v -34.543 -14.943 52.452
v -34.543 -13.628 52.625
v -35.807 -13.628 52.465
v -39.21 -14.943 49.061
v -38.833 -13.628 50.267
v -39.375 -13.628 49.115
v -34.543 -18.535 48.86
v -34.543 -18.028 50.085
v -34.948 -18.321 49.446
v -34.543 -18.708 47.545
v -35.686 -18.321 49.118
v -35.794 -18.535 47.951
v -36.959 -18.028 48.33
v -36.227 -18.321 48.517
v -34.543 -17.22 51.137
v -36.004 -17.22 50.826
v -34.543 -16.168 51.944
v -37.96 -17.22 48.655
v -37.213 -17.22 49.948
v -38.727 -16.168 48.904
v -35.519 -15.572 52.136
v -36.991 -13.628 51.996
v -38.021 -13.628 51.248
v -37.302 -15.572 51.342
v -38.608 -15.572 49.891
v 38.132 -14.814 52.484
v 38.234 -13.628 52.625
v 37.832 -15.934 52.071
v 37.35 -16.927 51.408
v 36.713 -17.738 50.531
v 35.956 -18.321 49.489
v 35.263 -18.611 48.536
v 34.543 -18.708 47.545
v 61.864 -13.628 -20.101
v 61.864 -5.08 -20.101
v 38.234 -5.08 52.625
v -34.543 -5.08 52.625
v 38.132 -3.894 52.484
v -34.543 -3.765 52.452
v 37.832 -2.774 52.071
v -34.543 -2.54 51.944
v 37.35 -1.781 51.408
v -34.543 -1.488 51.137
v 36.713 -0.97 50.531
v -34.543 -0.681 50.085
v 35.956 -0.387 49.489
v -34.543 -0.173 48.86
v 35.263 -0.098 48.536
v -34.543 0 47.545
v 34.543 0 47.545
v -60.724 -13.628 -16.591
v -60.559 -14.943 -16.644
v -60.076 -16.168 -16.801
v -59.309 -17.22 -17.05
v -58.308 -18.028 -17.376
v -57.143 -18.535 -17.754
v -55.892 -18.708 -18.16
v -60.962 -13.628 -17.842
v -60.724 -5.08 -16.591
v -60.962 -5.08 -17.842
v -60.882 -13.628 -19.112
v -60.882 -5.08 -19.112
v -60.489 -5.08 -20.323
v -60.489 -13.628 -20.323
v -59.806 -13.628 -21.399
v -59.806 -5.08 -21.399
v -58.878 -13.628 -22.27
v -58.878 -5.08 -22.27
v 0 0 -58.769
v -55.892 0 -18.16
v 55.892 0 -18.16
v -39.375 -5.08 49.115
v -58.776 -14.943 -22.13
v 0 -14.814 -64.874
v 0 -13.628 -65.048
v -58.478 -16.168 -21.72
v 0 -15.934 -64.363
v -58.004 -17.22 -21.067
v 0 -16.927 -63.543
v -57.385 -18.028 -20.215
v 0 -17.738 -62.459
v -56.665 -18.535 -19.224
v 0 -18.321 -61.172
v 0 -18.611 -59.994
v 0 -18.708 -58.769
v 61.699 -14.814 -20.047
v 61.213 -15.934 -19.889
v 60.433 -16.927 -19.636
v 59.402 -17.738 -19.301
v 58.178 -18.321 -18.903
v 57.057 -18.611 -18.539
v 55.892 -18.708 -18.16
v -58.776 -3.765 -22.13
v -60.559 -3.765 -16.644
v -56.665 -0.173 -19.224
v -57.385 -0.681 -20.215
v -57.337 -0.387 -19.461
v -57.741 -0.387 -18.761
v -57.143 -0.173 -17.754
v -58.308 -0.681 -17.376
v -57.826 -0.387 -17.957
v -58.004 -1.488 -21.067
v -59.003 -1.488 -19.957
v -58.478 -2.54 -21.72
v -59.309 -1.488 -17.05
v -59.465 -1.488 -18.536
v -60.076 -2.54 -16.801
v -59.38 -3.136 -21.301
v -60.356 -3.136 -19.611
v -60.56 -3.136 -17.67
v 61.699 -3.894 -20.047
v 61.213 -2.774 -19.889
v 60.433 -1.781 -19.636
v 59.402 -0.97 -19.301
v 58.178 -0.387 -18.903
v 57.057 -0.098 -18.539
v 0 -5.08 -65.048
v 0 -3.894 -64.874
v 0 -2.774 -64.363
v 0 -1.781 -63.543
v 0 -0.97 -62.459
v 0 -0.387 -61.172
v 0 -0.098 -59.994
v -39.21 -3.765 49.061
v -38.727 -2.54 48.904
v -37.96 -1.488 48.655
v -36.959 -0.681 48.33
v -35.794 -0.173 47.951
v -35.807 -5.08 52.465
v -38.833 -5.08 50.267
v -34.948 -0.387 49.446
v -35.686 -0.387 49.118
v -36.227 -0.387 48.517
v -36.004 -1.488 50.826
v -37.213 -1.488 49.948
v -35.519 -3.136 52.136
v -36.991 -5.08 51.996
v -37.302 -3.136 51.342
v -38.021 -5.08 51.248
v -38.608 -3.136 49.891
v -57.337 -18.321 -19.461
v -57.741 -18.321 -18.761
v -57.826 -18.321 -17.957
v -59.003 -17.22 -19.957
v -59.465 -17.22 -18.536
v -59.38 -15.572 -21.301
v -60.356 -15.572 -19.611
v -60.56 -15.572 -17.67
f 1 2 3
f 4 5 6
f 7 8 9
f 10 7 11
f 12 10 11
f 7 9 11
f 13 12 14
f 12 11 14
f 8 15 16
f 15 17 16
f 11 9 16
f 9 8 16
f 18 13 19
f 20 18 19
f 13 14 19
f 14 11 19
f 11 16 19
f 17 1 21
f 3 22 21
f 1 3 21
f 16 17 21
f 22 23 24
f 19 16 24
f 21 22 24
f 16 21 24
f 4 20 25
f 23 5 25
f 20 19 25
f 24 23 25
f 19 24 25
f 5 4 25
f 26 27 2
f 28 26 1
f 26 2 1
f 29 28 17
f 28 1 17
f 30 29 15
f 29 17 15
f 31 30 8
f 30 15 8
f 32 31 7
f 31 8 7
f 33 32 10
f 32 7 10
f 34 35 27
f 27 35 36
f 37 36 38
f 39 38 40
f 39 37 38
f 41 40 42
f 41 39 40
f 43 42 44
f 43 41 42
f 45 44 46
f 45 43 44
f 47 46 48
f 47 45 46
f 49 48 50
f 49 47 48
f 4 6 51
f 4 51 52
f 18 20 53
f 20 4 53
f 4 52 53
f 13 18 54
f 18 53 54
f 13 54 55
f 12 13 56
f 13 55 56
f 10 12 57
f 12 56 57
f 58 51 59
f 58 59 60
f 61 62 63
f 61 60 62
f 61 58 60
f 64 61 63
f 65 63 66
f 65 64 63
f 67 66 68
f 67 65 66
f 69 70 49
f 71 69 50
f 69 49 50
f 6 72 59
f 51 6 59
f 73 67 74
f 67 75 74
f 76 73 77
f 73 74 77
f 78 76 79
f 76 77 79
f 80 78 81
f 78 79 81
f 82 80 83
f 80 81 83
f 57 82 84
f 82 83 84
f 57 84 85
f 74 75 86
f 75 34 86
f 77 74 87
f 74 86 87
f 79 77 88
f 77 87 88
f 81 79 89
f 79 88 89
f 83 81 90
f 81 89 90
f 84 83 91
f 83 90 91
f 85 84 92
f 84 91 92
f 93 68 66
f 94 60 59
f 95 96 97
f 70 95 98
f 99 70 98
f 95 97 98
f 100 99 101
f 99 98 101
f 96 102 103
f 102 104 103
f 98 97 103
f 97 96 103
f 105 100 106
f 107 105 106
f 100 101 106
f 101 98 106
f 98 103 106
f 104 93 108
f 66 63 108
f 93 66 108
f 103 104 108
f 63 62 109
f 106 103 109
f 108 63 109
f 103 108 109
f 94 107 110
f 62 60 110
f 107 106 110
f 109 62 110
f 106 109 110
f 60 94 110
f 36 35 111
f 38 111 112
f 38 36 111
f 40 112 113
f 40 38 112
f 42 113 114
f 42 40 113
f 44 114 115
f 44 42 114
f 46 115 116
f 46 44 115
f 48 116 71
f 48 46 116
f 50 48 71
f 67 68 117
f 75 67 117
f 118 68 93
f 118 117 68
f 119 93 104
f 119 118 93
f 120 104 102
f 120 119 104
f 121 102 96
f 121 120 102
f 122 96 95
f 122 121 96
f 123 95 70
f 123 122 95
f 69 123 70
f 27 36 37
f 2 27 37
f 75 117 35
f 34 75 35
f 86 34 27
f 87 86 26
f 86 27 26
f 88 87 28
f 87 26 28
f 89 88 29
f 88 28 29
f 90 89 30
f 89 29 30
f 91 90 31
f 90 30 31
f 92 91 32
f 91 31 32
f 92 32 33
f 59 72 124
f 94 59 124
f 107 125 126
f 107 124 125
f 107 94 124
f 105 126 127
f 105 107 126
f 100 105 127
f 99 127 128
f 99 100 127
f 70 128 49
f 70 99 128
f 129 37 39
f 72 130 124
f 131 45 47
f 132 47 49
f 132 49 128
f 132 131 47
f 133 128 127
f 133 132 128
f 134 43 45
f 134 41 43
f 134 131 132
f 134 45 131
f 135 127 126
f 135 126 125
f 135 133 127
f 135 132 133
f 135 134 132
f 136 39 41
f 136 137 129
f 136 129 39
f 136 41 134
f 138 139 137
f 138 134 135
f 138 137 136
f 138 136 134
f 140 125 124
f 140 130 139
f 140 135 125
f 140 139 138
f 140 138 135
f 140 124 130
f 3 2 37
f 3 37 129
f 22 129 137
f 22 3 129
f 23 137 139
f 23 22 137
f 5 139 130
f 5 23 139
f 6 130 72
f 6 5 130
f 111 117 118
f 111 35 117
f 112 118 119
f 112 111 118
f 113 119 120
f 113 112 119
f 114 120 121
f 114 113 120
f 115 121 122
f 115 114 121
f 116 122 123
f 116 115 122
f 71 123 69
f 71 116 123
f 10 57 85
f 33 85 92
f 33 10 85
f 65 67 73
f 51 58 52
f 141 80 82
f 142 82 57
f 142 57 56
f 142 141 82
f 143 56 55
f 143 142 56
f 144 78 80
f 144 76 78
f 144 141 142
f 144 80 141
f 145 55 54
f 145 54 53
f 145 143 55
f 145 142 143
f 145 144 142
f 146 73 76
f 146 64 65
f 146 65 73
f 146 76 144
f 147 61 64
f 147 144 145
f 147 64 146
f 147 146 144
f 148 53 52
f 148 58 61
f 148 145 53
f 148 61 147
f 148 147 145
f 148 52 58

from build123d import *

# Parameters (mm, degrees)
F1_DEPTH = 18.708162
F2_R     = 5.08


with BuildPart() as f1:
    # F0 (on Front) → F1 (new body)
    with BuildSketch(Plane.XZ):
        Polygon((38.234155, 52.624799), (-38.234155, 52.624799), (-61.864162, -20.100885), (0, -65.047829), (61.864162, -20.100885), align=None)
    extrude(amount=F1_DEPTH)

    # F2
    f2_edges = [f1.edges().sort_by_distance(p)[0] for p in [
        (50.049158, -18.708162, 16.261957),
        (50.049158, 0, 16.261957),
        (30.932081, -18.708162, -42.574357),
        (30.932081, 0, -42.574357),
        (-30.932081, 0, -42.574357),
        (-30.932081, -18.708162, -42.574357),
        (0, 0, 52.624799),
        (-50.049158, 0, 16.261957),
        (0, -18.708162, 52.624799),
        (-50.049158, -18.708162, 16.261957),
        (-38.234155, -9.354081, 52.624799),
        (-61.864162, -9.354081, -20.100885),
    ]]
    fillet(f2_edges, radius=F2_R)


solid = f1.part
